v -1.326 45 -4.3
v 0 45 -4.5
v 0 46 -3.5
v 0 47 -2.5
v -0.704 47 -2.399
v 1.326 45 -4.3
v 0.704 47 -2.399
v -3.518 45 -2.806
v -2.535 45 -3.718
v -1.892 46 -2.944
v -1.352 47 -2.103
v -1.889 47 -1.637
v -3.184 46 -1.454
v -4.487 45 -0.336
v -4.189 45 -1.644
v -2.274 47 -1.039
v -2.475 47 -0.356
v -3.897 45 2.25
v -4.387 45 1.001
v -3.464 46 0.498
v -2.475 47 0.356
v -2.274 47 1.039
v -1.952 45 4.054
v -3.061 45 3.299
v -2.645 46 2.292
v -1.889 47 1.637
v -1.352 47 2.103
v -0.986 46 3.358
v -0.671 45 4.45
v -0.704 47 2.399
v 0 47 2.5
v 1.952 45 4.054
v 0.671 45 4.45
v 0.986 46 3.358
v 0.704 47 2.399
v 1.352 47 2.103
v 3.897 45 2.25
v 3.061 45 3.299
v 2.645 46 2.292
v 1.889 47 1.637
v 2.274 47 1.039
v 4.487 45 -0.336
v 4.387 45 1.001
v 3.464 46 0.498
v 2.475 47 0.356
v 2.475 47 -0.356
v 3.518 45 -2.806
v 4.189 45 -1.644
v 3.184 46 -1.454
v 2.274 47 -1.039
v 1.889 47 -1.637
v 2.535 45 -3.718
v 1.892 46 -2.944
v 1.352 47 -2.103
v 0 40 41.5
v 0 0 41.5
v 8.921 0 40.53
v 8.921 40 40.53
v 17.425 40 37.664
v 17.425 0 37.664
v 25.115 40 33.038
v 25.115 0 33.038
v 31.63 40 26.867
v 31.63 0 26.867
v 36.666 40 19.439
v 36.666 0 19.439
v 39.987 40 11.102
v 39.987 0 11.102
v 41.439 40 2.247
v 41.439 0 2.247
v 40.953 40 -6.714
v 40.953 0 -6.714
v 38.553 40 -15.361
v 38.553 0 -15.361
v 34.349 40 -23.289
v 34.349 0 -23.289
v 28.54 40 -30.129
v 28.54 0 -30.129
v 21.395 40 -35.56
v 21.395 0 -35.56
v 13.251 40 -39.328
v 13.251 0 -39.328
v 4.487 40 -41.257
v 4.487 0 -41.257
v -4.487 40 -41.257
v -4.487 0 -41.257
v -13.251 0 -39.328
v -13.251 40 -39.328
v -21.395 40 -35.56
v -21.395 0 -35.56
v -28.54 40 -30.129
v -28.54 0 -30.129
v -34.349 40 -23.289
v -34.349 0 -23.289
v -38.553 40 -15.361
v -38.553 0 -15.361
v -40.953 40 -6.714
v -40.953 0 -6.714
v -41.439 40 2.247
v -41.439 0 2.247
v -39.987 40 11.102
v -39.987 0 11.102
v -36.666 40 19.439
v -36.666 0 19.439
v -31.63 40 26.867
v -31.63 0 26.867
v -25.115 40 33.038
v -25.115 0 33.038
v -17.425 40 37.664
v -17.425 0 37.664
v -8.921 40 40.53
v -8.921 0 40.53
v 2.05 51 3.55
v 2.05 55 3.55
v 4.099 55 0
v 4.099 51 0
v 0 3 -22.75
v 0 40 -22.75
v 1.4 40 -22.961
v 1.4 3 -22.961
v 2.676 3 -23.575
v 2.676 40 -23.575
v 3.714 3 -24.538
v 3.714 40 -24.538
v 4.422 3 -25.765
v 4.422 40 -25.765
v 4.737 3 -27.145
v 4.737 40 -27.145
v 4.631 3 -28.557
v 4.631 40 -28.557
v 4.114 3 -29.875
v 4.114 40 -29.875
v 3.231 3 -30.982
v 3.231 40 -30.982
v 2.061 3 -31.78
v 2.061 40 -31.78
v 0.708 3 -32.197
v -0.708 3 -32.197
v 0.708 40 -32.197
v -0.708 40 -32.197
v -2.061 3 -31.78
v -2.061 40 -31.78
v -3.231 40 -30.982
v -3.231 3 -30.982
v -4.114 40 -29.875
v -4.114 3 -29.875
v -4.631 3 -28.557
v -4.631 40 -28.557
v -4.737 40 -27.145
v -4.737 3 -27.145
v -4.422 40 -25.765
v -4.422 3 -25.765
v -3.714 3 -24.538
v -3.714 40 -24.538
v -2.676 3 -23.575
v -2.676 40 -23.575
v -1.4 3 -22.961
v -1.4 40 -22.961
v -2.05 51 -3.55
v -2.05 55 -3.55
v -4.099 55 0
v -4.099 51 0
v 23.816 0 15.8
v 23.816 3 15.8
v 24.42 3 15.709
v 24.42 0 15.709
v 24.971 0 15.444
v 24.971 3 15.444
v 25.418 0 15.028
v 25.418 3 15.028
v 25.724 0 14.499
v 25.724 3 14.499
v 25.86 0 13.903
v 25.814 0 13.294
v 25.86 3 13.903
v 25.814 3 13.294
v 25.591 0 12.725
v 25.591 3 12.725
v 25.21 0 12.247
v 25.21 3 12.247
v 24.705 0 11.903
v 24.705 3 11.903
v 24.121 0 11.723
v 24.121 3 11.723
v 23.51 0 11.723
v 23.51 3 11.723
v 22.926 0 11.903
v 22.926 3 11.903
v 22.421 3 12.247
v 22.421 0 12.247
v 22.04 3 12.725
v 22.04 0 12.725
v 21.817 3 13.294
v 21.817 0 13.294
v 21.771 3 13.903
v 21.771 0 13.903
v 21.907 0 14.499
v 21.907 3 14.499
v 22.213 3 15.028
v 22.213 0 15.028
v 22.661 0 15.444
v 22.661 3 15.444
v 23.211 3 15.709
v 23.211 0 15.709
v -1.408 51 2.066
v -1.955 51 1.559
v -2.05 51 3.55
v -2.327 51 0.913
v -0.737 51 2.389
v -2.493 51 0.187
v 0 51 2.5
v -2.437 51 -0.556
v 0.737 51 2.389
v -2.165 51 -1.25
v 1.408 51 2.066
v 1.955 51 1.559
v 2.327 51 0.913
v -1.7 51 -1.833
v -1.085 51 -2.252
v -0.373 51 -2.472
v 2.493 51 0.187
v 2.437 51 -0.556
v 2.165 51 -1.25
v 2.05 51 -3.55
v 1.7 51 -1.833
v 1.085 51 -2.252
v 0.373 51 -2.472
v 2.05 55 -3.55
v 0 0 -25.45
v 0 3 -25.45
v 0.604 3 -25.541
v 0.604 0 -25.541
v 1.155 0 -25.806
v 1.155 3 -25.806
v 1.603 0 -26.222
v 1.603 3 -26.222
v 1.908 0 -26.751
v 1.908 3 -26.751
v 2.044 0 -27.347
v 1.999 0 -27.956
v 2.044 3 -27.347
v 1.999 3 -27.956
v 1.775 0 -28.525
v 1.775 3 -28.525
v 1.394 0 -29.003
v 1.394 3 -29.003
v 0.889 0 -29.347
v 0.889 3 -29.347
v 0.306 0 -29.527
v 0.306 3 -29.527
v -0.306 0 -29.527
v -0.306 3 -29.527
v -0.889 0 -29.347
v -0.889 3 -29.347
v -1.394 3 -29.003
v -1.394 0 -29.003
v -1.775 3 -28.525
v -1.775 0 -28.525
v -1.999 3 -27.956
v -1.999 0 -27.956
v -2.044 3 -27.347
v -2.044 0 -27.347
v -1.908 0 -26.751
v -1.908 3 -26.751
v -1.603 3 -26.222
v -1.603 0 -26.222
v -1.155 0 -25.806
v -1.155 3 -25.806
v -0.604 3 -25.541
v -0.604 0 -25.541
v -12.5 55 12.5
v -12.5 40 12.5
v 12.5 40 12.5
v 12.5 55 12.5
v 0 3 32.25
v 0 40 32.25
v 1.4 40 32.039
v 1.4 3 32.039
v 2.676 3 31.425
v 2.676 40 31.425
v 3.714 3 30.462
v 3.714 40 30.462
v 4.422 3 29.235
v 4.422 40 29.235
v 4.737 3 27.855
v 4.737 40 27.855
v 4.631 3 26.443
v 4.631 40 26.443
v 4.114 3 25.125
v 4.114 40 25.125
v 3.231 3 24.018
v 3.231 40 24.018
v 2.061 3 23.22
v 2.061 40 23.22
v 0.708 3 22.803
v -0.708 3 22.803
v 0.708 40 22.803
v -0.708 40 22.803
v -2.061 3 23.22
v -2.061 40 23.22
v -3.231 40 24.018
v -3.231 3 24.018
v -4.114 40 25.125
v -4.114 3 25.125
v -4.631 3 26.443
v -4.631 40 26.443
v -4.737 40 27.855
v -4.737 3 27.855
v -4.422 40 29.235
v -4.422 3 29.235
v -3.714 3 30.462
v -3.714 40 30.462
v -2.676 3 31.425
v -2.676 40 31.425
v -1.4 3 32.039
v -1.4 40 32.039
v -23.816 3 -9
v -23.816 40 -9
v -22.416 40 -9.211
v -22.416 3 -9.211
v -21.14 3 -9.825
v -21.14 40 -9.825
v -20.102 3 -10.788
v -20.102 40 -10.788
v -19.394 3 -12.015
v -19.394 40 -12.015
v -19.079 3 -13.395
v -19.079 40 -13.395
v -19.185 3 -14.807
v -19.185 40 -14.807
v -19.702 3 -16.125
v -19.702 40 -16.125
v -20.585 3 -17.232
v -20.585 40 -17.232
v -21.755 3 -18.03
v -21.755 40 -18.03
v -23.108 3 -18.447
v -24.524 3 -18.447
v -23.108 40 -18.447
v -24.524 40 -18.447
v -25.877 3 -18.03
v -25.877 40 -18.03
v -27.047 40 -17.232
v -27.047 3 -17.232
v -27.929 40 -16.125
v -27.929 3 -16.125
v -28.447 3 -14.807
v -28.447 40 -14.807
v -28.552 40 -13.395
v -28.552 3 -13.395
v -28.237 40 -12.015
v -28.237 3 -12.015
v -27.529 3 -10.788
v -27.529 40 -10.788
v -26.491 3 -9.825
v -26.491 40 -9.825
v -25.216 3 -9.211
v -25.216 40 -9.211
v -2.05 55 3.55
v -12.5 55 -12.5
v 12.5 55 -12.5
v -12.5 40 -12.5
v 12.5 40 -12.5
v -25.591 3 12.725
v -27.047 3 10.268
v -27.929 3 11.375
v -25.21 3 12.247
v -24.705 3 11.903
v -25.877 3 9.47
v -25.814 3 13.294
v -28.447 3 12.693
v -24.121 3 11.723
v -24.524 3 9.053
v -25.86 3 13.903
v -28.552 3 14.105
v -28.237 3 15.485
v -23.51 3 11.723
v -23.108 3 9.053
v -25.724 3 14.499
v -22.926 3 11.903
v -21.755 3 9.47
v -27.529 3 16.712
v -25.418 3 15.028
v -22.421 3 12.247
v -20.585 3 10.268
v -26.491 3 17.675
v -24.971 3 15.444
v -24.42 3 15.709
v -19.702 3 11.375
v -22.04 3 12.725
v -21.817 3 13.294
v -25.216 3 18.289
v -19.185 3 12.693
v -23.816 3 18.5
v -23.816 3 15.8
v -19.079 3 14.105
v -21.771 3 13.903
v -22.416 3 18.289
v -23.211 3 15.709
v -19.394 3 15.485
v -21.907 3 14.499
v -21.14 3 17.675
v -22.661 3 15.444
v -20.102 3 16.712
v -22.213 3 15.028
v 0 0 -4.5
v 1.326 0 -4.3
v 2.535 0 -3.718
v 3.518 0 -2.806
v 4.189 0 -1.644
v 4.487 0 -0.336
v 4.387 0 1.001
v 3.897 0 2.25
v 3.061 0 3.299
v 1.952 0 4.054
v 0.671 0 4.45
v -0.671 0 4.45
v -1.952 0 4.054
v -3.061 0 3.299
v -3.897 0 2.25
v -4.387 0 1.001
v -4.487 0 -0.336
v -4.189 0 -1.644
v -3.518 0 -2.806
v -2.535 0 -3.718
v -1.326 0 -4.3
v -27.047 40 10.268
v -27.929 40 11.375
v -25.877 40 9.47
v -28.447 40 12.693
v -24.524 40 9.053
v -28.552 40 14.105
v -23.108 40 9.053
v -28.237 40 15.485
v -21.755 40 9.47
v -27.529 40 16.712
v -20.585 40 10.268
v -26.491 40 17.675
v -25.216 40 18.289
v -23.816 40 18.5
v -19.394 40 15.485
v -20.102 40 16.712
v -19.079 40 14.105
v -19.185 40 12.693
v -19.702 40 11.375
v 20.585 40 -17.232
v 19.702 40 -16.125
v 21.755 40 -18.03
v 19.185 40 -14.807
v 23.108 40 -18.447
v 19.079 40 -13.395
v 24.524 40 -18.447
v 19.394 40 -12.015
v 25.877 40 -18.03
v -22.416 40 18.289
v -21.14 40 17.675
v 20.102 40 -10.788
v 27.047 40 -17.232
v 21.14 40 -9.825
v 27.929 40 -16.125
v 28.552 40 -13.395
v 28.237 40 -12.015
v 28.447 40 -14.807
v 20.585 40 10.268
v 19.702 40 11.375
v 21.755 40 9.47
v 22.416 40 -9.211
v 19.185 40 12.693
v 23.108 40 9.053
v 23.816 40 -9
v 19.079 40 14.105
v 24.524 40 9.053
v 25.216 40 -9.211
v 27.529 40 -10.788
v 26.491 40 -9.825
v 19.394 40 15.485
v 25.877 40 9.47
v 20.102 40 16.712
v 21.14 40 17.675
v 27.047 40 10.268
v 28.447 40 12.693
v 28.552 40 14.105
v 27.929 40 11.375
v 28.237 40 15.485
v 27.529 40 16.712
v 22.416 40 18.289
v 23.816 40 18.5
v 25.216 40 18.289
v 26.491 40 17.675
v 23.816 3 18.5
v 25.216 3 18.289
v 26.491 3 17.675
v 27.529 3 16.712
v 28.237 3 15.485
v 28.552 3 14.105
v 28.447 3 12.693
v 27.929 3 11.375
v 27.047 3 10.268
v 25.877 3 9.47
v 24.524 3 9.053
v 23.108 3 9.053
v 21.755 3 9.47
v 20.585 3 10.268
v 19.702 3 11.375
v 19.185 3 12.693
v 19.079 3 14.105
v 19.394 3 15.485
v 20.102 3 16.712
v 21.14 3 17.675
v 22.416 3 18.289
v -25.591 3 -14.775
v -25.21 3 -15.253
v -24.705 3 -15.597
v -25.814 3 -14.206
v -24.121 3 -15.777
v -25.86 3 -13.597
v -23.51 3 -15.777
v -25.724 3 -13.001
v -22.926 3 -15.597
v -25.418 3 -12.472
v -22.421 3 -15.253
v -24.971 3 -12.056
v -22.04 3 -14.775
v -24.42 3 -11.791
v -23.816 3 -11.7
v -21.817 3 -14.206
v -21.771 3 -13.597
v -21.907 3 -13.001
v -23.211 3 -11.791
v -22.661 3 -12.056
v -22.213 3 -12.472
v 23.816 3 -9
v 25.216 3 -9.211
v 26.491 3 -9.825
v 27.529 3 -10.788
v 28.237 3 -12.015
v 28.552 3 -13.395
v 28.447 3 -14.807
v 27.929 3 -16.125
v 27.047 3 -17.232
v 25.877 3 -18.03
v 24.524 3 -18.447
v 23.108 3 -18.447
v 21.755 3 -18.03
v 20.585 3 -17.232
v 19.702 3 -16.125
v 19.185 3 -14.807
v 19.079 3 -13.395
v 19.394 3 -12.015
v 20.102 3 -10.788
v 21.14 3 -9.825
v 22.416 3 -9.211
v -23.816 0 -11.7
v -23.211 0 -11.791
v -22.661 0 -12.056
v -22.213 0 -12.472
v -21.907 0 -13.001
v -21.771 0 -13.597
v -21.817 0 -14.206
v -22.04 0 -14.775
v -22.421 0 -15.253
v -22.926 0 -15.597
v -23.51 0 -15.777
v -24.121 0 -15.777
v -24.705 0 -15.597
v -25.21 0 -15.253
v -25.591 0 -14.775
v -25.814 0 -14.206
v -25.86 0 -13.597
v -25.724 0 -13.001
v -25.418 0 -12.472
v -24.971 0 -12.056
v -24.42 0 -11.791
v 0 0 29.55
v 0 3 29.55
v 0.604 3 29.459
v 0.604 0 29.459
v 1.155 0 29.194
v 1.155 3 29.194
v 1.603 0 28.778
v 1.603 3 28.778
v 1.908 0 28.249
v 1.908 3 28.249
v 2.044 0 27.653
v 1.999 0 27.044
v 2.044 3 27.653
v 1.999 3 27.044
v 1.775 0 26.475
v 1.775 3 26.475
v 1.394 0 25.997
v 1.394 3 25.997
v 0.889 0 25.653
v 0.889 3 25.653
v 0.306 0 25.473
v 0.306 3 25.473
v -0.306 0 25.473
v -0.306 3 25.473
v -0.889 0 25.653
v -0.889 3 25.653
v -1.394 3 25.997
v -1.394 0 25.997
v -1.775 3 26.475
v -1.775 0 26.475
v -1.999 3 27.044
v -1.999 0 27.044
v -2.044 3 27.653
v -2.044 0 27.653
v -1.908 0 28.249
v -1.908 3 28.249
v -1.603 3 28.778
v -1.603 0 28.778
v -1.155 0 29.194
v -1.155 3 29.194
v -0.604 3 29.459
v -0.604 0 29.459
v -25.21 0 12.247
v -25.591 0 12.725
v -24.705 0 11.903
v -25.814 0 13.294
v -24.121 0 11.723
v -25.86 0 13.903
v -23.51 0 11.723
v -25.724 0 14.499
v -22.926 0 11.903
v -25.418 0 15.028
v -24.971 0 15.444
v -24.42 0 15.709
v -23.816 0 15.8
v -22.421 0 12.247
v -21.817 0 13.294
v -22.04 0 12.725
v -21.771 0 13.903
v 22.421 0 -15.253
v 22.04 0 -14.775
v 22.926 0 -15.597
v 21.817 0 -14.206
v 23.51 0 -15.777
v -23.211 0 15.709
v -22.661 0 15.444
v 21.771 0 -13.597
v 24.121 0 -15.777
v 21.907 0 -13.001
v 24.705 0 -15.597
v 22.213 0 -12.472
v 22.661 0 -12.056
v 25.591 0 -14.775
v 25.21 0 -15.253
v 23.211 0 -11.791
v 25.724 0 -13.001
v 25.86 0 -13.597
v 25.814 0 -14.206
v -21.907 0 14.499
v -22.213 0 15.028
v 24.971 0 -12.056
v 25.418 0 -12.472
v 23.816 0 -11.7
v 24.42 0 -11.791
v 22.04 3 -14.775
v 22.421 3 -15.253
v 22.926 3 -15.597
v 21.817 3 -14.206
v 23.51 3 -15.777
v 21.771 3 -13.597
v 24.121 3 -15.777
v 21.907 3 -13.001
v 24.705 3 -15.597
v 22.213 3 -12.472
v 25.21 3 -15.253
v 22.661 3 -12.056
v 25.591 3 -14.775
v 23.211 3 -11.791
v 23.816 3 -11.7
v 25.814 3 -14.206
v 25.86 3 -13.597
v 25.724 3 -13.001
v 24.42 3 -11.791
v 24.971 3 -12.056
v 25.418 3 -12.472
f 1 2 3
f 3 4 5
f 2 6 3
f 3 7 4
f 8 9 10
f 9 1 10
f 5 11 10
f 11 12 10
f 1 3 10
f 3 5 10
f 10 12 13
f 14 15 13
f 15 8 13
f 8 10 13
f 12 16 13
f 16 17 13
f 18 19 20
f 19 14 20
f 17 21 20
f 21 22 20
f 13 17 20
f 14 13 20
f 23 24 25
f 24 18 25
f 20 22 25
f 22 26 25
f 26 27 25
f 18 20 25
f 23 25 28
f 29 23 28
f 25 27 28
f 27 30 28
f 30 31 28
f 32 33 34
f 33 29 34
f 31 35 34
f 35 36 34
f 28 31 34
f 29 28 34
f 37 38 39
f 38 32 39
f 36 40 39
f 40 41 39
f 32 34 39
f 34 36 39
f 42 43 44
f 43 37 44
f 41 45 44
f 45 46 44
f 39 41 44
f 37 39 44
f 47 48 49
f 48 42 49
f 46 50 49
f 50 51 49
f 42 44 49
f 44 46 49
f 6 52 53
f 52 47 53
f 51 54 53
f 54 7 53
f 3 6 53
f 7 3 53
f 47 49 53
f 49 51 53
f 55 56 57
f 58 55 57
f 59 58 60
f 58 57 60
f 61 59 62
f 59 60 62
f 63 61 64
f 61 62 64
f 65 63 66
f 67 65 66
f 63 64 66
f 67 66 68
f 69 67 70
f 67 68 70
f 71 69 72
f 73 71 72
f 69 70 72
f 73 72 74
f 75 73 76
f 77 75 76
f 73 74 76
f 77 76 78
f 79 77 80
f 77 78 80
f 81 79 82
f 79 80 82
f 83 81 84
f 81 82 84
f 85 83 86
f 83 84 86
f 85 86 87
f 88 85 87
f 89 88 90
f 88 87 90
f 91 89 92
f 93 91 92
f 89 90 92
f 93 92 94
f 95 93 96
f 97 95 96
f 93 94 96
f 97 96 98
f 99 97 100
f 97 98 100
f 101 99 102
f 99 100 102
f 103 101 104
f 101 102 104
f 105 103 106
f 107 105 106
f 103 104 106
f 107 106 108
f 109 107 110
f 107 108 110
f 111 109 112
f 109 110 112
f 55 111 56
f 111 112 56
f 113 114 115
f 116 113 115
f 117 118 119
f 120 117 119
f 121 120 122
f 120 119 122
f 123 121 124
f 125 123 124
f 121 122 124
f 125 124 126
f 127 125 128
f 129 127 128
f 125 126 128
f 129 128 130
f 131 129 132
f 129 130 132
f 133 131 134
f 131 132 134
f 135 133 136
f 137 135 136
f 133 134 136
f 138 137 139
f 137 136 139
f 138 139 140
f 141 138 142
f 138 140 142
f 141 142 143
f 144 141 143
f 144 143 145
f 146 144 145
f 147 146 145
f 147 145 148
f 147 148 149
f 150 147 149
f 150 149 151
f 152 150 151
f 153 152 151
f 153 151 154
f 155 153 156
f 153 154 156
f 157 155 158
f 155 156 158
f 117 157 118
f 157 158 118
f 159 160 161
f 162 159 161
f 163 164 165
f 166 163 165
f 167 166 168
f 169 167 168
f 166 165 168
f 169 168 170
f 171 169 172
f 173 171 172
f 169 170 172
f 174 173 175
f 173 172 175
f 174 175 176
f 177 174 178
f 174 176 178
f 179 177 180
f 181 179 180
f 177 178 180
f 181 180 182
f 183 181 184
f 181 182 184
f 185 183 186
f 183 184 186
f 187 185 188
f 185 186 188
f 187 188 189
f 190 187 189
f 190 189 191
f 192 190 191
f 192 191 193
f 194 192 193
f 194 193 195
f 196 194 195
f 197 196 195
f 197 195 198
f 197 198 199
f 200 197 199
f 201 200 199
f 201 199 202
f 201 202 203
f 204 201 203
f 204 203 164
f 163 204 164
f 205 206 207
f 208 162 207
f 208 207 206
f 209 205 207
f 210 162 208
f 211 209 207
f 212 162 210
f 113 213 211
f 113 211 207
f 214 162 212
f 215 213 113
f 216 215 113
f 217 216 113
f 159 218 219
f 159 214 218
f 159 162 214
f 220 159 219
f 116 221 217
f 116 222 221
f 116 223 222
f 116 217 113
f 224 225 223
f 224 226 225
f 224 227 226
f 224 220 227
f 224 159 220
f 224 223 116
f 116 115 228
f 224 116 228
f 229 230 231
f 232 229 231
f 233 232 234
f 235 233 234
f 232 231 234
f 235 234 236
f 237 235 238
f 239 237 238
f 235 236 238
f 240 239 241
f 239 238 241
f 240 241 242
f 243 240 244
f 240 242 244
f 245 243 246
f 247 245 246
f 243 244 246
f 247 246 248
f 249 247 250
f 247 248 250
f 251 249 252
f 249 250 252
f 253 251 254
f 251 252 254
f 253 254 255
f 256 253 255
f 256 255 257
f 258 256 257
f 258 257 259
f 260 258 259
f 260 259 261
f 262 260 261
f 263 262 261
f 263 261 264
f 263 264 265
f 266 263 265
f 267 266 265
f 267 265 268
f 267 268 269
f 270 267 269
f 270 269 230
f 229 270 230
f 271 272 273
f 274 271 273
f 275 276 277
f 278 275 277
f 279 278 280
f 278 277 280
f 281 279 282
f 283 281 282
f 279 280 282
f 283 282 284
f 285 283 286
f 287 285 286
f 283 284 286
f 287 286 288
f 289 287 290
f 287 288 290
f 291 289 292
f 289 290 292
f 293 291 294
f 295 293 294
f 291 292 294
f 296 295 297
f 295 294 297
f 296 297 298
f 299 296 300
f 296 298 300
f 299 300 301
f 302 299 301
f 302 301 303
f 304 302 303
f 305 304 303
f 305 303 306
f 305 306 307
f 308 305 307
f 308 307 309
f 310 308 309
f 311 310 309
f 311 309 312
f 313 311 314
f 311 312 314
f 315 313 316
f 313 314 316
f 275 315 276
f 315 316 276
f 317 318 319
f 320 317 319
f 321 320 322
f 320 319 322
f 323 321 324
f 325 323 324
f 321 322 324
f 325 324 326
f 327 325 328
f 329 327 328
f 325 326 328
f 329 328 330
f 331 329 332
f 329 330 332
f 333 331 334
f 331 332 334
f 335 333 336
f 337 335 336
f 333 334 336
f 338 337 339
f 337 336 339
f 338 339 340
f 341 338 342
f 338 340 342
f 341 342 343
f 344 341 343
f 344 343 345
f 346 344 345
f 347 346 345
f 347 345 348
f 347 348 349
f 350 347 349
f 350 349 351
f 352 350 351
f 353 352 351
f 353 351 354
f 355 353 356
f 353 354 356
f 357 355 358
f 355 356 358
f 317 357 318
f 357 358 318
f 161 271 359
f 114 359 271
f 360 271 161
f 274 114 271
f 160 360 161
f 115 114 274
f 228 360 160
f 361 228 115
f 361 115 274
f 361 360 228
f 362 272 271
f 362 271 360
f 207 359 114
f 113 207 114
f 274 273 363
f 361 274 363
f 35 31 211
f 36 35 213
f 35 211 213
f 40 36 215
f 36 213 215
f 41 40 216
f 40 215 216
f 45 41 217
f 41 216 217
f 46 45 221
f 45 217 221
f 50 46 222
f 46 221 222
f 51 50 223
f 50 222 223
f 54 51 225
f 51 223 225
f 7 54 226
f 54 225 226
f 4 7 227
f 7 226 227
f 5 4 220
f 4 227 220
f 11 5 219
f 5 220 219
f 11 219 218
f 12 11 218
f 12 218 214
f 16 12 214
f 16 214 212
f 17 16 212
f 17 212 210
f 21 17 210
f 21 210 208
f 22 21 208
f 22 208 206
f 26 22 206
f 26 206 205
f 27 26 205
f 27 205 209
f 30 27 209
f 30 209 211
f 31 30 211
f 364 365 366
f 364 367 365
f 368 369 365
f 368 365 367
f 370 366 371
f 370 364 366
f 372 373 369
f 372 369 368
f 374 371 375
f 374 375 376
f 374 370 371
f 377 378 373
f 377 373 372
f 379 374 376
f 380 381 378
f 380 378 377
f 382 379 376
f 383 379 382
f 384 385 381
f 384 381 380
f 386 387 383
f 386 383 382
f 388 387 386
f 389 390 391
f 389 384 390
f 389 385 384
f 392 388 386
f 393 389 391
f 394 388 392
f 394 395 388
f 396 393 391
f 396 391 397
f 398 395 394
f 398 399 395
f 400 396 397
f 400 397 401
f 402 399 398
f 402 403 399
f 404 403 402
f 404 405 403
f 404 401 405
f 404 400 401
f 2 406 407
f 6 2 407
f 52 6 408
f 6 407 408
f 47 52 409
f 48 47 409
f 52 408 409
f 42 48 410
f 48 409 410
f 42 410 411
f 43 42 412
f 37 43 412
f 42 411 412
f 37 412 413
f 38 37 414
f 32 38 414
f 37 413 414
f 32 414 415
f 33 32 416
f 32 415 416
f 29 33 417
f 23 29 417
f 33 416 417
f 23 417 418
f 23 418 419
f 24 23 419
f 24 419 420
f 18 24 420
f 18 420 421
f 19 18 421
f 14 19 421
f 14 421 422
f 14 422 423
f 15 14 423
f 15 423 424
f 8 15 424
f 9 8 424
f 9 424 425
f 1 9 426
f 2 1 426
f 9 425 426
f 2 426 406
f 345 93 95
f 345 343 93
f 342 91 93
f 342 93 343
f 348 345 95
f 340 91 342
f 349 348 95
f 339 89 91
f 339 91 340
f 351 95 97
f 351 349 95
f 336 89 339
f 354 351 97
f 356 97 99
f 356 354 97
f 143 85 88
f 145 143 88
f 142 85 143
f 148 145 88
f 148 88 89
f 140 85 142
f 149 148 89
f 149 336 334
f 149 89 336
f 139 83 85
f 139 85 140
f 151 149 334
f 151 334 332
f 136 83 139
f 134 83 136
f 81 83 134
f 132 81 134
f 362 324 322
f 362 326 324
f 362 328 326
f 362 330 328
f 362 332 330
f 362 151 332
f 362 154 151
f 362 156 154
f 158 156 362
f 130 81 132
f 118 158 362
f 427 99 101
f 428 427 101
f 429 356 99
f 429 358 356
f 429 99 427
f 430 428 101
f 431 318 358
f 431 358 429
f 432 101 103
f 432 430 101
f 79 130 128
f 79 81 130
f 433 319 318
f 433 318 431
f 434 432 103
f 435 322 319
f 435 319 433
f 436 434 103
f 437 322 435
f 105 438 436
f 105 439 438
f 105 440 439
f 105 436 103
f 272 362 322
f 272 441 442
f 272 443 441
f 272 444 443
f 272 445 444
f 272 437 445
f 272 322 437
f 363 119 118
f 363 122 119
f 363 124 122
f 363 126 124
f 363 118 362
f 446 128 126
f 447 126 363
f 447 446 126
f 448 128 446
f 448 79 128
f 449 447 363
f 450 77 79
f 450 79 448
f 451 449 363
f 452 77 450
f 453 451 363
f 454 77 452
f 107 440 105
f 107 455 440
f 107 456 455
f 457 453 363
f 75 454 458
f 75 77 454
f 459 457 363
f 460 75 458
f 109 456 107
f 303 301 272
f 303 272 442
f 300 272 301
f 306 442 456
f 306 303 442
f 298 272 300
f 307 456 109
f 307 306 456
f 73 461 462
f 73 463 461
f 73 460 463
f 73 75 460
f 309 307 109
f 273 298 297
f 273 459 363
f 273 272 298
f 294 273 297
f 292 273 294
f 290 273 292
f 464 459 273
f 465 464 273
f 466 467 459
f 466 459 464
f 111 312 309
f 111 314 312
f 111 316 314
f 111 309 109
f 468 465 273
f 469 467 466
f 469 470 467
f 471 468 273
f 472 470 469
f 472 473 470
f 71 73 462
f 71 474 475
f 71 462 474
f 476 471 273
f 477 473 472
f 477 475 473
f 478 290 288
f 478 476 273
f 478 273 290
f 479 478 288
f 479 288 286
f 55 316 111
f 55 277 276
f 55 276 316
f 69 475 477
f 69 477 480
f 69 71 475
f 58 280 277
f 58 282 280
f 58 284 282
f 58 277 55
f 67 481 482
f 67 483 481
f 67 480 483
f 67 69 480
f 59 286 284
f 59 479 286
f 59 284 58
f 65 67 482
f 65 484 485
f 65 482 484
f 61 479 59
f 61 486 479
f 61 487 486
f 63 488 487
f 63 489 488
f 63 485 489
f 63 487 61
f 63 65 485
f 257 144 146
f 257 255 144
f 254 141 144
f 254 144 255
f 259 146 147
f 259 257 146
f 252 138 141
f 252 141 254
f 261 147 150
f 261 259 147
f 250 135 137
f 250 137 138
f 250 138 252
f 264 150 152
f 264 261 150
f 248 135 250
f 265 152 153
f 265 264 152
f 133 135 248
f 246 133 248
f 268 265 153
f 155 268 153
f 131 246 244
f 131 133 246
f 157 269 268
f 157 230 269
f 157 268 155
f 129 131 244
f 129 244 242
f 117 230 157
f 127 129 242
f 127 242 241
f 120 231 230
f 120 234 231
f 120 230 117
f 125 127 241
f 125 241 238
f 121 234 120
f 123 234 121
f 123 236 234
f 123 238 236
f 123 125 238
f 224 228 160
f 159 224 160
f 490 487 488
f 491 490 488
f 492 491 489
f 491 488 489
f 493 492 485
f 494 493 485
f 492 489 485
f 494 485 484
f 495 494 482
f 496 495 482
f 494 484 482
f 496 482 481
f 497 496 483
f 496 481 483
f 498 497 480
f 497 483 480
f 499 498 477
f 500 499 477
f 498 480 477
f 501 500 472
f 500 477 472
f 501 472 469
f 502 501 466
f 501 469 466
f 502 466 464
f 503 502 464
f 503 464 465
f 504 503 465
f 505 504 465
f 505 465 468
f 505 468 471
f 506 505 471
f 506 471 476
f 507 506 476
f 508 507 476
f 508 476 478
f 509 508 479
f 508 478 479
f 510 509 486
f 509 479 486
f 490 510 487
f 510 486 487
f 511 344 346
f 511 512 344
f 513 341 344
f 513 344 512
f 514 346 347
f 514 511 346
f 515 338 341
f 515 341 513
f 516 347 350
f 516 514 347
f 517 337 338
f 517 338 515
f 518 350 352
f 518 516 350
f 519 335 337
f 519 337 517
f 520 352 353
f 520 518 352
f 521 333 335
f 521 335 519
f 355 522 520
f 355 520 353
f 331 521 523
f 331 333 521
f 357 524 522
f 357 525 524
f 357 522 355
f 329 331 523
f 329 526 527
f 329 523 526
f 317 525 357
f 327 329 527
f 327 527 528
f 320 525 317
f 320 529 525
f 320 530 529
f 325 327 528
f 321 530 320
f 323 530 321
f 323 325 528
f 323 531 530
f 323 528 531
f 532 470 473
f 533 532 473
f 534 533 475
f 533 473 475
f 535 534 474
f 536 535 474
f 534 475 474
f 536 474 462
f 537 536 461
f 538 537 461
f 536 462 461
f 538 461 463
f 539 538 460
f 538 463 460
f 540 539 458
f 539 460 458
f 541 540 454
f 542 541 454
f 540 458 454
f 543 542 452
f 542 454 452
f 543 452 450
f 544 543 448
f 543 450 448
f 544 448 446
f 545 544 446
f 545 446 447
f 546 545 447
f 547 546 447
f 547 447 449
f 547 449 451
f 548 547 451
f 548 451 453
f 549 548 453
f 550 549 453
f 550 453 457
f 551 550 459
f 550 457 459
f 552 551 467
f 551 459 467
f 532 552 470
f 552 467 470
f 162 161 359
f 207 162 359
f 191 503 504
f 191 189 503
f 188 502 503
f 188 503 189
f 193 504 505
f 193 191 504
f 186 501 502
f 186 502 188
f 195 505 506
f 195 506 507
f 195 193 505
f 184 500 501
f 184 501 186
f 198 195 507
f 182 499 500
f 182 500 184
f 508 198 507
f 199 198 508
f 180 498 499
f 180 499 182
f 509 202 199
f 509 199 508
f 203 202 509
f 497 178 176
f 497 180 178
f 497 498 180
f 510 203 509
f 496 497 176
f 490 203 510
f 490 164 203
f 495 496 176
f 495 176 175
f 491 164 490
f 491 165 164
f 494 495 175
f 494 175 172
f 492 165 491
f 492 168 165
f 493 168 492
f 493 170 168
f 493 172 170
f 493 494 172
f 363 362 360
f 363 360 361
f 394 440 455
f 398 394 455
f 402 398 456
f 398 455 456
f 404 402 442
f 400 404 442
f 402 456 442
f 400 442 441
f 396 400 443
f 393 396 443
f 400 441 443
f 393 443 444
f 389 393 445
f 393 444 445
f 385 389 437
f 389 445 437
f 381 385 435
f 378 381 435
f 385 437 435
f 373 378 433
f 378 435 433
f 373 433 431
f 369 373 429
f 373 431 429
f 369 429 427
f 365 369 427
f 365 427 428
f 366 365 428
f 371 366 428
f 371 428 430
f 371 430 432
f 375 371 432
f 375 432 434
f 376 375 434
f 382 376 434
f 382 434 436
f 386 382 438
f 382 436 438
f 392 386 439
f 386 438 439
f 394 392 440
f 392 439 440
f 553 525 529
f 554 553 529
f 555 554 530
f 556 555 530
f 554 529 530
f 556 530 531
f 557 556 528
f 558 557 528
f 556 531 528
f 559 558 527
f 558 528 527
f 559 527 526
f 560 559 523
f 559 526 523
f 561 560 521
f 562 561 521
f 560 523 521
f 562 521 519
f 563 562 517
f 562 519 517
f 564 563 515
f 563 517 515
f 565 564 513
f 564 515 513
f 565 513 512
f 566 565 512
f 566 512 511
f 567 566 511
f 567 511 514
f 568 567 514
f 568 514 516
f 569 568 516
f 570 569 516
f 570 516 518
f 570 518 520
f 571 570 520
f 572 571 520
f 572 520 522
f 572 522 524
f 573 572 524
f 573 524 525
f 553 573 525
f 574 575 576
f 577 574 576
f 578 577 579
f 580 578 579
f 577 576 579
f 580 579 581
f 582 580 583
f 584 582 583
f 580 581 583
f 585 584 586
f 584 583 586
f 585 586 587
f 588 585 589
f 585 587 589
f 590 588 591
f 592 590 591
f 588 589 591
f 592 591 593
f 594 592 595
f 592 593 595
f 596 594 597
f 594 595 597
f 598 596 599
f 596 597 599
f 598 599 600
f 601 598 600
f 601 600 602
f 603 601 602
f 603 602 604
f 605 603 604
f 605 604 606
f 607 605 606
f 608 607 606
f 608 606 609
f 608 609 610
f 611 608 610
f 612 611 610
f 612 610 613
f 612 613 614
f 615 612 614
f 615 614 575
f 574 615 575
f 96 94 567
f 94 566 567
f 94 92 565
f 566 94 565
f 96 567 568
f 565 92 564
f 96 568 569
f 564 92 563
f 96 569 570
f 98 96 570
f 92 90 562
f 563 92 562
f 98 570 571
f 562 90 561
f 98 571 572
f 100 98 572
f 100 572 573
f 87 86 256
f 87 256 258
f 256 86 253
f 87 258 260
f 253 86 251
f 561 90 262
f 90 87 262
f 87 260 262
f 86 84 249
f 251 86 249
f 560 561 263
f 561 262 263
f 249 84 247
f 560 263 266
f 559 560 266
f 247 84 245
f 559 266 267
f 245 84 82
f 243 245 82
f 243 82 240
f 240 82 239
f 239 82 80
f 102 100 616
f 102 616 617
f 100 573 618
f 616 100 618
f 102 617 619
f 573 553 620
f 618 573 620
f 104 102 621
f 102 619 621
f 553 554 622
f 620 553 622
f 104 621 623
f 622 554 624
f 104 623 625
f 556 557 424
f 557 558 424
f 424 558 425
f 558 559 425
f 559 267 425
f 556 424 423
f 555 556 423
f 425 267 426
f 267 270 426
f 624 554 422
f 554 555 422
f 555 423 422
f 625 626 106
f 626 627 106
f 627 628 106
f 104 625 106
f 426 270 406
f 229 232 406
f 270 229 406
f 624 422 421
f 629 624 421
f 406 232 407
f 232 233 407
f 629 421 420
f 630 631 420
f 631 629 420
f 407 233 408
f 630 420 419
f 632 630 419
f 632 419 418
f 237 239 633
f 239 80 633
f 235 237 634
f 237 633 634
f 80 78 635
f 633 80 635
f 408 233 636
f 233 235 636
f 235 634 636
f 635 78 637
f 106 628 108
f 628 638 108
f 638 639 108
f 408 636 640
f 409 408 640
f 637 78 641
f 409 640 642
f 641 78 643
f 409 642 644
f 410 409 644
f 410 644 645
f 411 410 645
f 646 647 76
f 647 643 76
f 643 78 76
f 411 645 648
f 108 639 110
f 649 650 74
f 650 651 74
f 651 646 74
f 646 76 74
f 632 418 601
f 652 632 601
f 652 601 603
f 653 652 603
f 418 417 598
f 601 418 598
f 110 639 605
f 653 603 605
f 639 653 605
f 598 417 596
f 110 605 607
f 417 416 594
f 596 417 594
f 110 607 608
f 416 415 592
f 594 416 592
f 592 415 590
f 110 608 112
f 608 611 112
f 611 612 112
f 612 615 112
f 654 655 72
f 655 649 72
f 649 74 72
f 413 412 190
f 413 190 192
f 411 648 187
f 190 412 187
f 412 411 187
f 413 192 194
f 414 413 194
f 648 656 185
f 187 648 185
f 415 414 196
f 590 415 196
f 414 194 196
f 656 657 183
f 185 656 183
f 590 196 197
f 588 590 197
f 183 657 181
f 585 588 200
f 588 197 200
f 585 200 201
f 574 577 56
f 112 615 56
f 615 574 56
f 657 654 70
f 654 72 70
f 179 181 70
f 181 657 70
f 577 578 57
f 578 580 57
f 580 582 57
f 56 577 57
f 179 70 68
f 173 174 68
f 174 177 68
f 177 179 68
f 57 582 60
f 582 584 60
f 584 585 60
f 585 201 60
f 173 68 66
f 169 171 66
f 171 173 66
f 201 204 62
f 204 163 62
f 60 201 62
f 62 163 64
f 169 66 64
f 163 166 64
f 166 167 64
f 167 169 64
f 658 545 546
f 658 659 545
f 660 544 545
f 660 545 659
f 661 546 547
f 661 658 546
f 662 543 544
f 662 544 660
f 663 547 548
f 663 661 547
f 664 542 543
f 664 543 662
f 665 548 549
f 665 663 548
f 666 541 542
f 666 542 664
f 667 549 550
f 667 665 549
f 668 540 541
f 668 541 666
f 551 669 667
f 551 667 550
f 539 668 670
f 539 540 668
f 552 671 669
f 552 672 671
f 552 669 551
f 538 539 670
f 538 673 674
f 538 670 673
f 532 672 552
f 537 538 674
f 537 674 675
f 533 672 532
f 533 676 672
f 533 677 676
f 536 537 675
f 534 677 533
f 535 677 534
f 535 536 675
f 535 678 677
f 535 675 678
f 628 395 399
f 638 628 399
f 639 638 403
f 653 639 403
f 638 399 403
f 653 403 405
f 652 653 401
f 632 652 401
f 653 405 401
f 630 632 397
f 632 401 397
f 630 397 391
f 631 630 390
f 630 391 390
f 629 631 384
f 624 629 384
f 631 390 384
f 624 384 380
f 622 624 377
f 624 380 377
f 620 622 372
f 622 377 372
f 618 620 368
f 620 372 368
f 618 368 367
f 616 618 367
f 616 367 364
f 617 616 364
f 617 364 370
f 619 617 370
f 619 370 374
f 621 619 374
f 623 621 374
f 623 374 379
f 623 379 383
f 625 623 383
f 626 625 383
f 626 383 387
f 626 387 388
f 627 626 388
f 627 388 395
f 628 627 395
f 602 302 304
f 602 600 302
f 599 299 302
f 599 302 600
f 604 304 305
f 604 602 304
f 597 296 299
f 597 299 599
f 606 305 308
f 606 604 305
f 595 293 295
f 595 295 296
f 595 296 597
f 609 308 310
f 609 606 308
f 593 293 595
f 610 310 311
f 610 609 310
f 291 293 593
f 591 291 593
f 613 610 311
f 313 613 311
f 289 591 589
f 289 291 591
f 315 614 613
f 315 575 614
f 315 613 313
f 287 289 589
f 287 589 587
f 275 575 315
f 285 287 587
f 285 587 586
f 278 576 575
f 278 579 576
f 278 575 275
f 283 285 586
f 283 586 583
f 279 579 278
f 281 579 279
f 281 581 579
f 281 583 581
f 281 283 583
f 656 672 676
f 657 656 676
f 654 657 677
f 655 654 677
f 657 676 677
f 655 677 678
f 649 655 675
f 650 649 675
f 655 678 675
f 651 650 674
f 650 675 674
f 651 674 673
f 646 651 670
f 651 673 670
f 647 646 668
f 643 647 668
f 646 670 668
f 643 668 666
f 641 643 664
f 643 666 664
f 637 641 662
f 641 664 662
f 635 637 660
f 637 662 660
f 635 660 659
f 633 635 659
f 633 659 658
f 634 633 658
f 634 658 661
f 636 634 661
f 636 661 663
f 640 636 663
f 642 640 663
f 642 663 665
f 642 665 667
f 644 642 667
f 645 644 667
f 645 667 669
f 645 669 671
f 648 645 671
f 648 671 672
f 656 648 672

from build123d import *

# Parameters (mm, degrees)
SKETCH1_R             = 41.5
MAIN_PLATE_DEPTH      = 40
SKETCH2_R             = 2.05
CUT_EXTRUDE_G27_DEPTH = 72.024643611
SKETCH5_R             = 4.75
G27_SCREW_HEADS_DEPTH = 37
SKETCH6_W             = 25
SKETCH6_H             = 25
BOSS_EXTRUDE1_DEPTH   = 15
SKETCH8_R             = 4.5
CUT_EXTRUDE1_DEPTH    = 45
SKETCH10_R            = 2.5
CUT_EXTRUDE3_DEPTH    = 81.4332021
CUT_EXTRUDE4_DEPTH    = 4


with BuildPart() as part:
    # Sketch1 → Main Plate (new body)
    with BuildSketch(Plane(origin=(0, 0, 0), x_dir=(1, 0, 0), z_dir=(0, 1, 0))):
        with Locations(Location((0, 0, 0), (0, 0, 270))):
            Circle(SKETCH1_R)
    extrude(amount=MAIN_PLATE_DEPTH)

    # Sketch2 → Cut-Extrude G27 (cut, through all)
    with BuildSketch(Plane(origin=(0, 40, 0), x_dir=(1, 0, 0), z_dir=(0, 1, 0))):
        with Locations(Location((0, 27.5, 0), (0, 0, 270))):
            Circle(SKETCH2_R)
        with Locations(Location((23.815698604, 13.75, 0), (0, 0, 270))):
            Circle(SKETCH2_R)
        with Locations(Location((23.815698604, -13.75, 0), (0, 0, 270))):
            Circle(SKETCH2_R)
        with Locations(Location((0, -27.5, 0), (0, 0, 270))):
            Circle(SKETCH2_R)
        with Locations(Location((-23.815698604, -13.75, 0), (0, 0, 270))):
            Circle(SKETCH2_R)
        with Locations(Location((-23.815698604, 13.75, 0), (0, 0, 270))):
            Circle(SKETCH2_R)
    extrude(amount=-CUT_EXTRUDE_G27_DEPTH, mode=Mode.SUBTRACT)

    # Sketch5 → G27 Screw Heads (cut)
    with BuildSketch(Plane(origin=(0, 40, 0), x_dir=(1, 0, 0), z_dir=(0, 1, 0))):
        with Locations(Location((0, 27.5, 0), (0, 0, 270))):
            Circle(SKETCH5_R)
        with Locations(Location((23.815698604, 13.75, 0), (0, 0, 270))):
            Circle(SKETCH5_R)
        with Locations(Location((23.815698604, -13.75, 0), (0, 0, 270))):
            Circle(SKETCH5_R)
        with Locations(Location((0, -27.5, 0), (0, 0, 270))):
            Circle(SKETCH5_R)
        with Locations(Location((-23.815698604, -13.75, 0), (0, 0, 270))):
            Circle(SKETCH5_R)
        with Locations(Location((-23.815698604, 13.75, 0), (0, 0, 270))):
            Circle(SKETCH5_R)
    extrude(amount=-G27_SCREW_HEADS_DEPTH, mode=Mode.SUBTRACT)

    # Sketch6 → Boss-Extrude1 (add)
    with BuildSketch(Plane(origin=(0, 40, 0), x_dir=(1, 0, 0), z_dir=(0, 1, 0))):
        Rectangle(SKETCH6_W, SKETCH6_H)
    extrude(amount=BOSS_EXTRUDE1_DEPTH)

    # Sketch8 → Cut-Extrude1 (cut)
    with BuildSketch(Plane.XZ):
        with Locations(Location((0, 0, 0), (0, 0, 270))):
            Circle(SKETCH8_R)
    extrude(amount=-CUT_EXTRUDE1_DEPTH, mode=Mode.SUBTRACT)

    # Cut-Extrude2 cone 1 section (through the dimple's axis) → Cut-Extrude2 (revolve, cut)
    with BuildSketch(Plane(origin=(0, 45, 0), x_dir=(0, 0, -1), z_dir=(1, 0, 0))):
        Polygon((0, 0), (4.5, 0), (0, 4.5), align=None)
    revolve(axis=Axis((0, 45, 0), (0, 1, 0)), mode=Mode.SUBTRACT)

    # Sketch10 → Cut-Extrude3 (cut, through all)
    with BuildSketch(Plane(origin=(0, 55, 0), x_dir=(1, 0, 0), z_dir=(0, 1, 0))):
        with Locations(Location((0, 0, 0), (0, 0, 270))):
            Circle(SKETCH10_R)
    extrude(amount=-CUT_EXTRUDE3_DEPTH, mode=Mode.SUBTRACT)

    # Sketch11 → Cut-Extrude4 (cut)
    with BuildSketch(Plane(origin=(0, 55, 0), x_dir=(1, 0, 0), z_dir=(0, 1, 0))):
        Polygon((-4.099186911, 0), (-2.049593456, -3.55), (2.049593456, -3.55), (4.099186911, 0), (2.049593456, 3.55), (-2.049593456, 3.55), align=None)
    extrude(amount=-CUT_EXTRUDE4_DEPTH, mode=Mode.SUBTRACT)


solid = part.part
